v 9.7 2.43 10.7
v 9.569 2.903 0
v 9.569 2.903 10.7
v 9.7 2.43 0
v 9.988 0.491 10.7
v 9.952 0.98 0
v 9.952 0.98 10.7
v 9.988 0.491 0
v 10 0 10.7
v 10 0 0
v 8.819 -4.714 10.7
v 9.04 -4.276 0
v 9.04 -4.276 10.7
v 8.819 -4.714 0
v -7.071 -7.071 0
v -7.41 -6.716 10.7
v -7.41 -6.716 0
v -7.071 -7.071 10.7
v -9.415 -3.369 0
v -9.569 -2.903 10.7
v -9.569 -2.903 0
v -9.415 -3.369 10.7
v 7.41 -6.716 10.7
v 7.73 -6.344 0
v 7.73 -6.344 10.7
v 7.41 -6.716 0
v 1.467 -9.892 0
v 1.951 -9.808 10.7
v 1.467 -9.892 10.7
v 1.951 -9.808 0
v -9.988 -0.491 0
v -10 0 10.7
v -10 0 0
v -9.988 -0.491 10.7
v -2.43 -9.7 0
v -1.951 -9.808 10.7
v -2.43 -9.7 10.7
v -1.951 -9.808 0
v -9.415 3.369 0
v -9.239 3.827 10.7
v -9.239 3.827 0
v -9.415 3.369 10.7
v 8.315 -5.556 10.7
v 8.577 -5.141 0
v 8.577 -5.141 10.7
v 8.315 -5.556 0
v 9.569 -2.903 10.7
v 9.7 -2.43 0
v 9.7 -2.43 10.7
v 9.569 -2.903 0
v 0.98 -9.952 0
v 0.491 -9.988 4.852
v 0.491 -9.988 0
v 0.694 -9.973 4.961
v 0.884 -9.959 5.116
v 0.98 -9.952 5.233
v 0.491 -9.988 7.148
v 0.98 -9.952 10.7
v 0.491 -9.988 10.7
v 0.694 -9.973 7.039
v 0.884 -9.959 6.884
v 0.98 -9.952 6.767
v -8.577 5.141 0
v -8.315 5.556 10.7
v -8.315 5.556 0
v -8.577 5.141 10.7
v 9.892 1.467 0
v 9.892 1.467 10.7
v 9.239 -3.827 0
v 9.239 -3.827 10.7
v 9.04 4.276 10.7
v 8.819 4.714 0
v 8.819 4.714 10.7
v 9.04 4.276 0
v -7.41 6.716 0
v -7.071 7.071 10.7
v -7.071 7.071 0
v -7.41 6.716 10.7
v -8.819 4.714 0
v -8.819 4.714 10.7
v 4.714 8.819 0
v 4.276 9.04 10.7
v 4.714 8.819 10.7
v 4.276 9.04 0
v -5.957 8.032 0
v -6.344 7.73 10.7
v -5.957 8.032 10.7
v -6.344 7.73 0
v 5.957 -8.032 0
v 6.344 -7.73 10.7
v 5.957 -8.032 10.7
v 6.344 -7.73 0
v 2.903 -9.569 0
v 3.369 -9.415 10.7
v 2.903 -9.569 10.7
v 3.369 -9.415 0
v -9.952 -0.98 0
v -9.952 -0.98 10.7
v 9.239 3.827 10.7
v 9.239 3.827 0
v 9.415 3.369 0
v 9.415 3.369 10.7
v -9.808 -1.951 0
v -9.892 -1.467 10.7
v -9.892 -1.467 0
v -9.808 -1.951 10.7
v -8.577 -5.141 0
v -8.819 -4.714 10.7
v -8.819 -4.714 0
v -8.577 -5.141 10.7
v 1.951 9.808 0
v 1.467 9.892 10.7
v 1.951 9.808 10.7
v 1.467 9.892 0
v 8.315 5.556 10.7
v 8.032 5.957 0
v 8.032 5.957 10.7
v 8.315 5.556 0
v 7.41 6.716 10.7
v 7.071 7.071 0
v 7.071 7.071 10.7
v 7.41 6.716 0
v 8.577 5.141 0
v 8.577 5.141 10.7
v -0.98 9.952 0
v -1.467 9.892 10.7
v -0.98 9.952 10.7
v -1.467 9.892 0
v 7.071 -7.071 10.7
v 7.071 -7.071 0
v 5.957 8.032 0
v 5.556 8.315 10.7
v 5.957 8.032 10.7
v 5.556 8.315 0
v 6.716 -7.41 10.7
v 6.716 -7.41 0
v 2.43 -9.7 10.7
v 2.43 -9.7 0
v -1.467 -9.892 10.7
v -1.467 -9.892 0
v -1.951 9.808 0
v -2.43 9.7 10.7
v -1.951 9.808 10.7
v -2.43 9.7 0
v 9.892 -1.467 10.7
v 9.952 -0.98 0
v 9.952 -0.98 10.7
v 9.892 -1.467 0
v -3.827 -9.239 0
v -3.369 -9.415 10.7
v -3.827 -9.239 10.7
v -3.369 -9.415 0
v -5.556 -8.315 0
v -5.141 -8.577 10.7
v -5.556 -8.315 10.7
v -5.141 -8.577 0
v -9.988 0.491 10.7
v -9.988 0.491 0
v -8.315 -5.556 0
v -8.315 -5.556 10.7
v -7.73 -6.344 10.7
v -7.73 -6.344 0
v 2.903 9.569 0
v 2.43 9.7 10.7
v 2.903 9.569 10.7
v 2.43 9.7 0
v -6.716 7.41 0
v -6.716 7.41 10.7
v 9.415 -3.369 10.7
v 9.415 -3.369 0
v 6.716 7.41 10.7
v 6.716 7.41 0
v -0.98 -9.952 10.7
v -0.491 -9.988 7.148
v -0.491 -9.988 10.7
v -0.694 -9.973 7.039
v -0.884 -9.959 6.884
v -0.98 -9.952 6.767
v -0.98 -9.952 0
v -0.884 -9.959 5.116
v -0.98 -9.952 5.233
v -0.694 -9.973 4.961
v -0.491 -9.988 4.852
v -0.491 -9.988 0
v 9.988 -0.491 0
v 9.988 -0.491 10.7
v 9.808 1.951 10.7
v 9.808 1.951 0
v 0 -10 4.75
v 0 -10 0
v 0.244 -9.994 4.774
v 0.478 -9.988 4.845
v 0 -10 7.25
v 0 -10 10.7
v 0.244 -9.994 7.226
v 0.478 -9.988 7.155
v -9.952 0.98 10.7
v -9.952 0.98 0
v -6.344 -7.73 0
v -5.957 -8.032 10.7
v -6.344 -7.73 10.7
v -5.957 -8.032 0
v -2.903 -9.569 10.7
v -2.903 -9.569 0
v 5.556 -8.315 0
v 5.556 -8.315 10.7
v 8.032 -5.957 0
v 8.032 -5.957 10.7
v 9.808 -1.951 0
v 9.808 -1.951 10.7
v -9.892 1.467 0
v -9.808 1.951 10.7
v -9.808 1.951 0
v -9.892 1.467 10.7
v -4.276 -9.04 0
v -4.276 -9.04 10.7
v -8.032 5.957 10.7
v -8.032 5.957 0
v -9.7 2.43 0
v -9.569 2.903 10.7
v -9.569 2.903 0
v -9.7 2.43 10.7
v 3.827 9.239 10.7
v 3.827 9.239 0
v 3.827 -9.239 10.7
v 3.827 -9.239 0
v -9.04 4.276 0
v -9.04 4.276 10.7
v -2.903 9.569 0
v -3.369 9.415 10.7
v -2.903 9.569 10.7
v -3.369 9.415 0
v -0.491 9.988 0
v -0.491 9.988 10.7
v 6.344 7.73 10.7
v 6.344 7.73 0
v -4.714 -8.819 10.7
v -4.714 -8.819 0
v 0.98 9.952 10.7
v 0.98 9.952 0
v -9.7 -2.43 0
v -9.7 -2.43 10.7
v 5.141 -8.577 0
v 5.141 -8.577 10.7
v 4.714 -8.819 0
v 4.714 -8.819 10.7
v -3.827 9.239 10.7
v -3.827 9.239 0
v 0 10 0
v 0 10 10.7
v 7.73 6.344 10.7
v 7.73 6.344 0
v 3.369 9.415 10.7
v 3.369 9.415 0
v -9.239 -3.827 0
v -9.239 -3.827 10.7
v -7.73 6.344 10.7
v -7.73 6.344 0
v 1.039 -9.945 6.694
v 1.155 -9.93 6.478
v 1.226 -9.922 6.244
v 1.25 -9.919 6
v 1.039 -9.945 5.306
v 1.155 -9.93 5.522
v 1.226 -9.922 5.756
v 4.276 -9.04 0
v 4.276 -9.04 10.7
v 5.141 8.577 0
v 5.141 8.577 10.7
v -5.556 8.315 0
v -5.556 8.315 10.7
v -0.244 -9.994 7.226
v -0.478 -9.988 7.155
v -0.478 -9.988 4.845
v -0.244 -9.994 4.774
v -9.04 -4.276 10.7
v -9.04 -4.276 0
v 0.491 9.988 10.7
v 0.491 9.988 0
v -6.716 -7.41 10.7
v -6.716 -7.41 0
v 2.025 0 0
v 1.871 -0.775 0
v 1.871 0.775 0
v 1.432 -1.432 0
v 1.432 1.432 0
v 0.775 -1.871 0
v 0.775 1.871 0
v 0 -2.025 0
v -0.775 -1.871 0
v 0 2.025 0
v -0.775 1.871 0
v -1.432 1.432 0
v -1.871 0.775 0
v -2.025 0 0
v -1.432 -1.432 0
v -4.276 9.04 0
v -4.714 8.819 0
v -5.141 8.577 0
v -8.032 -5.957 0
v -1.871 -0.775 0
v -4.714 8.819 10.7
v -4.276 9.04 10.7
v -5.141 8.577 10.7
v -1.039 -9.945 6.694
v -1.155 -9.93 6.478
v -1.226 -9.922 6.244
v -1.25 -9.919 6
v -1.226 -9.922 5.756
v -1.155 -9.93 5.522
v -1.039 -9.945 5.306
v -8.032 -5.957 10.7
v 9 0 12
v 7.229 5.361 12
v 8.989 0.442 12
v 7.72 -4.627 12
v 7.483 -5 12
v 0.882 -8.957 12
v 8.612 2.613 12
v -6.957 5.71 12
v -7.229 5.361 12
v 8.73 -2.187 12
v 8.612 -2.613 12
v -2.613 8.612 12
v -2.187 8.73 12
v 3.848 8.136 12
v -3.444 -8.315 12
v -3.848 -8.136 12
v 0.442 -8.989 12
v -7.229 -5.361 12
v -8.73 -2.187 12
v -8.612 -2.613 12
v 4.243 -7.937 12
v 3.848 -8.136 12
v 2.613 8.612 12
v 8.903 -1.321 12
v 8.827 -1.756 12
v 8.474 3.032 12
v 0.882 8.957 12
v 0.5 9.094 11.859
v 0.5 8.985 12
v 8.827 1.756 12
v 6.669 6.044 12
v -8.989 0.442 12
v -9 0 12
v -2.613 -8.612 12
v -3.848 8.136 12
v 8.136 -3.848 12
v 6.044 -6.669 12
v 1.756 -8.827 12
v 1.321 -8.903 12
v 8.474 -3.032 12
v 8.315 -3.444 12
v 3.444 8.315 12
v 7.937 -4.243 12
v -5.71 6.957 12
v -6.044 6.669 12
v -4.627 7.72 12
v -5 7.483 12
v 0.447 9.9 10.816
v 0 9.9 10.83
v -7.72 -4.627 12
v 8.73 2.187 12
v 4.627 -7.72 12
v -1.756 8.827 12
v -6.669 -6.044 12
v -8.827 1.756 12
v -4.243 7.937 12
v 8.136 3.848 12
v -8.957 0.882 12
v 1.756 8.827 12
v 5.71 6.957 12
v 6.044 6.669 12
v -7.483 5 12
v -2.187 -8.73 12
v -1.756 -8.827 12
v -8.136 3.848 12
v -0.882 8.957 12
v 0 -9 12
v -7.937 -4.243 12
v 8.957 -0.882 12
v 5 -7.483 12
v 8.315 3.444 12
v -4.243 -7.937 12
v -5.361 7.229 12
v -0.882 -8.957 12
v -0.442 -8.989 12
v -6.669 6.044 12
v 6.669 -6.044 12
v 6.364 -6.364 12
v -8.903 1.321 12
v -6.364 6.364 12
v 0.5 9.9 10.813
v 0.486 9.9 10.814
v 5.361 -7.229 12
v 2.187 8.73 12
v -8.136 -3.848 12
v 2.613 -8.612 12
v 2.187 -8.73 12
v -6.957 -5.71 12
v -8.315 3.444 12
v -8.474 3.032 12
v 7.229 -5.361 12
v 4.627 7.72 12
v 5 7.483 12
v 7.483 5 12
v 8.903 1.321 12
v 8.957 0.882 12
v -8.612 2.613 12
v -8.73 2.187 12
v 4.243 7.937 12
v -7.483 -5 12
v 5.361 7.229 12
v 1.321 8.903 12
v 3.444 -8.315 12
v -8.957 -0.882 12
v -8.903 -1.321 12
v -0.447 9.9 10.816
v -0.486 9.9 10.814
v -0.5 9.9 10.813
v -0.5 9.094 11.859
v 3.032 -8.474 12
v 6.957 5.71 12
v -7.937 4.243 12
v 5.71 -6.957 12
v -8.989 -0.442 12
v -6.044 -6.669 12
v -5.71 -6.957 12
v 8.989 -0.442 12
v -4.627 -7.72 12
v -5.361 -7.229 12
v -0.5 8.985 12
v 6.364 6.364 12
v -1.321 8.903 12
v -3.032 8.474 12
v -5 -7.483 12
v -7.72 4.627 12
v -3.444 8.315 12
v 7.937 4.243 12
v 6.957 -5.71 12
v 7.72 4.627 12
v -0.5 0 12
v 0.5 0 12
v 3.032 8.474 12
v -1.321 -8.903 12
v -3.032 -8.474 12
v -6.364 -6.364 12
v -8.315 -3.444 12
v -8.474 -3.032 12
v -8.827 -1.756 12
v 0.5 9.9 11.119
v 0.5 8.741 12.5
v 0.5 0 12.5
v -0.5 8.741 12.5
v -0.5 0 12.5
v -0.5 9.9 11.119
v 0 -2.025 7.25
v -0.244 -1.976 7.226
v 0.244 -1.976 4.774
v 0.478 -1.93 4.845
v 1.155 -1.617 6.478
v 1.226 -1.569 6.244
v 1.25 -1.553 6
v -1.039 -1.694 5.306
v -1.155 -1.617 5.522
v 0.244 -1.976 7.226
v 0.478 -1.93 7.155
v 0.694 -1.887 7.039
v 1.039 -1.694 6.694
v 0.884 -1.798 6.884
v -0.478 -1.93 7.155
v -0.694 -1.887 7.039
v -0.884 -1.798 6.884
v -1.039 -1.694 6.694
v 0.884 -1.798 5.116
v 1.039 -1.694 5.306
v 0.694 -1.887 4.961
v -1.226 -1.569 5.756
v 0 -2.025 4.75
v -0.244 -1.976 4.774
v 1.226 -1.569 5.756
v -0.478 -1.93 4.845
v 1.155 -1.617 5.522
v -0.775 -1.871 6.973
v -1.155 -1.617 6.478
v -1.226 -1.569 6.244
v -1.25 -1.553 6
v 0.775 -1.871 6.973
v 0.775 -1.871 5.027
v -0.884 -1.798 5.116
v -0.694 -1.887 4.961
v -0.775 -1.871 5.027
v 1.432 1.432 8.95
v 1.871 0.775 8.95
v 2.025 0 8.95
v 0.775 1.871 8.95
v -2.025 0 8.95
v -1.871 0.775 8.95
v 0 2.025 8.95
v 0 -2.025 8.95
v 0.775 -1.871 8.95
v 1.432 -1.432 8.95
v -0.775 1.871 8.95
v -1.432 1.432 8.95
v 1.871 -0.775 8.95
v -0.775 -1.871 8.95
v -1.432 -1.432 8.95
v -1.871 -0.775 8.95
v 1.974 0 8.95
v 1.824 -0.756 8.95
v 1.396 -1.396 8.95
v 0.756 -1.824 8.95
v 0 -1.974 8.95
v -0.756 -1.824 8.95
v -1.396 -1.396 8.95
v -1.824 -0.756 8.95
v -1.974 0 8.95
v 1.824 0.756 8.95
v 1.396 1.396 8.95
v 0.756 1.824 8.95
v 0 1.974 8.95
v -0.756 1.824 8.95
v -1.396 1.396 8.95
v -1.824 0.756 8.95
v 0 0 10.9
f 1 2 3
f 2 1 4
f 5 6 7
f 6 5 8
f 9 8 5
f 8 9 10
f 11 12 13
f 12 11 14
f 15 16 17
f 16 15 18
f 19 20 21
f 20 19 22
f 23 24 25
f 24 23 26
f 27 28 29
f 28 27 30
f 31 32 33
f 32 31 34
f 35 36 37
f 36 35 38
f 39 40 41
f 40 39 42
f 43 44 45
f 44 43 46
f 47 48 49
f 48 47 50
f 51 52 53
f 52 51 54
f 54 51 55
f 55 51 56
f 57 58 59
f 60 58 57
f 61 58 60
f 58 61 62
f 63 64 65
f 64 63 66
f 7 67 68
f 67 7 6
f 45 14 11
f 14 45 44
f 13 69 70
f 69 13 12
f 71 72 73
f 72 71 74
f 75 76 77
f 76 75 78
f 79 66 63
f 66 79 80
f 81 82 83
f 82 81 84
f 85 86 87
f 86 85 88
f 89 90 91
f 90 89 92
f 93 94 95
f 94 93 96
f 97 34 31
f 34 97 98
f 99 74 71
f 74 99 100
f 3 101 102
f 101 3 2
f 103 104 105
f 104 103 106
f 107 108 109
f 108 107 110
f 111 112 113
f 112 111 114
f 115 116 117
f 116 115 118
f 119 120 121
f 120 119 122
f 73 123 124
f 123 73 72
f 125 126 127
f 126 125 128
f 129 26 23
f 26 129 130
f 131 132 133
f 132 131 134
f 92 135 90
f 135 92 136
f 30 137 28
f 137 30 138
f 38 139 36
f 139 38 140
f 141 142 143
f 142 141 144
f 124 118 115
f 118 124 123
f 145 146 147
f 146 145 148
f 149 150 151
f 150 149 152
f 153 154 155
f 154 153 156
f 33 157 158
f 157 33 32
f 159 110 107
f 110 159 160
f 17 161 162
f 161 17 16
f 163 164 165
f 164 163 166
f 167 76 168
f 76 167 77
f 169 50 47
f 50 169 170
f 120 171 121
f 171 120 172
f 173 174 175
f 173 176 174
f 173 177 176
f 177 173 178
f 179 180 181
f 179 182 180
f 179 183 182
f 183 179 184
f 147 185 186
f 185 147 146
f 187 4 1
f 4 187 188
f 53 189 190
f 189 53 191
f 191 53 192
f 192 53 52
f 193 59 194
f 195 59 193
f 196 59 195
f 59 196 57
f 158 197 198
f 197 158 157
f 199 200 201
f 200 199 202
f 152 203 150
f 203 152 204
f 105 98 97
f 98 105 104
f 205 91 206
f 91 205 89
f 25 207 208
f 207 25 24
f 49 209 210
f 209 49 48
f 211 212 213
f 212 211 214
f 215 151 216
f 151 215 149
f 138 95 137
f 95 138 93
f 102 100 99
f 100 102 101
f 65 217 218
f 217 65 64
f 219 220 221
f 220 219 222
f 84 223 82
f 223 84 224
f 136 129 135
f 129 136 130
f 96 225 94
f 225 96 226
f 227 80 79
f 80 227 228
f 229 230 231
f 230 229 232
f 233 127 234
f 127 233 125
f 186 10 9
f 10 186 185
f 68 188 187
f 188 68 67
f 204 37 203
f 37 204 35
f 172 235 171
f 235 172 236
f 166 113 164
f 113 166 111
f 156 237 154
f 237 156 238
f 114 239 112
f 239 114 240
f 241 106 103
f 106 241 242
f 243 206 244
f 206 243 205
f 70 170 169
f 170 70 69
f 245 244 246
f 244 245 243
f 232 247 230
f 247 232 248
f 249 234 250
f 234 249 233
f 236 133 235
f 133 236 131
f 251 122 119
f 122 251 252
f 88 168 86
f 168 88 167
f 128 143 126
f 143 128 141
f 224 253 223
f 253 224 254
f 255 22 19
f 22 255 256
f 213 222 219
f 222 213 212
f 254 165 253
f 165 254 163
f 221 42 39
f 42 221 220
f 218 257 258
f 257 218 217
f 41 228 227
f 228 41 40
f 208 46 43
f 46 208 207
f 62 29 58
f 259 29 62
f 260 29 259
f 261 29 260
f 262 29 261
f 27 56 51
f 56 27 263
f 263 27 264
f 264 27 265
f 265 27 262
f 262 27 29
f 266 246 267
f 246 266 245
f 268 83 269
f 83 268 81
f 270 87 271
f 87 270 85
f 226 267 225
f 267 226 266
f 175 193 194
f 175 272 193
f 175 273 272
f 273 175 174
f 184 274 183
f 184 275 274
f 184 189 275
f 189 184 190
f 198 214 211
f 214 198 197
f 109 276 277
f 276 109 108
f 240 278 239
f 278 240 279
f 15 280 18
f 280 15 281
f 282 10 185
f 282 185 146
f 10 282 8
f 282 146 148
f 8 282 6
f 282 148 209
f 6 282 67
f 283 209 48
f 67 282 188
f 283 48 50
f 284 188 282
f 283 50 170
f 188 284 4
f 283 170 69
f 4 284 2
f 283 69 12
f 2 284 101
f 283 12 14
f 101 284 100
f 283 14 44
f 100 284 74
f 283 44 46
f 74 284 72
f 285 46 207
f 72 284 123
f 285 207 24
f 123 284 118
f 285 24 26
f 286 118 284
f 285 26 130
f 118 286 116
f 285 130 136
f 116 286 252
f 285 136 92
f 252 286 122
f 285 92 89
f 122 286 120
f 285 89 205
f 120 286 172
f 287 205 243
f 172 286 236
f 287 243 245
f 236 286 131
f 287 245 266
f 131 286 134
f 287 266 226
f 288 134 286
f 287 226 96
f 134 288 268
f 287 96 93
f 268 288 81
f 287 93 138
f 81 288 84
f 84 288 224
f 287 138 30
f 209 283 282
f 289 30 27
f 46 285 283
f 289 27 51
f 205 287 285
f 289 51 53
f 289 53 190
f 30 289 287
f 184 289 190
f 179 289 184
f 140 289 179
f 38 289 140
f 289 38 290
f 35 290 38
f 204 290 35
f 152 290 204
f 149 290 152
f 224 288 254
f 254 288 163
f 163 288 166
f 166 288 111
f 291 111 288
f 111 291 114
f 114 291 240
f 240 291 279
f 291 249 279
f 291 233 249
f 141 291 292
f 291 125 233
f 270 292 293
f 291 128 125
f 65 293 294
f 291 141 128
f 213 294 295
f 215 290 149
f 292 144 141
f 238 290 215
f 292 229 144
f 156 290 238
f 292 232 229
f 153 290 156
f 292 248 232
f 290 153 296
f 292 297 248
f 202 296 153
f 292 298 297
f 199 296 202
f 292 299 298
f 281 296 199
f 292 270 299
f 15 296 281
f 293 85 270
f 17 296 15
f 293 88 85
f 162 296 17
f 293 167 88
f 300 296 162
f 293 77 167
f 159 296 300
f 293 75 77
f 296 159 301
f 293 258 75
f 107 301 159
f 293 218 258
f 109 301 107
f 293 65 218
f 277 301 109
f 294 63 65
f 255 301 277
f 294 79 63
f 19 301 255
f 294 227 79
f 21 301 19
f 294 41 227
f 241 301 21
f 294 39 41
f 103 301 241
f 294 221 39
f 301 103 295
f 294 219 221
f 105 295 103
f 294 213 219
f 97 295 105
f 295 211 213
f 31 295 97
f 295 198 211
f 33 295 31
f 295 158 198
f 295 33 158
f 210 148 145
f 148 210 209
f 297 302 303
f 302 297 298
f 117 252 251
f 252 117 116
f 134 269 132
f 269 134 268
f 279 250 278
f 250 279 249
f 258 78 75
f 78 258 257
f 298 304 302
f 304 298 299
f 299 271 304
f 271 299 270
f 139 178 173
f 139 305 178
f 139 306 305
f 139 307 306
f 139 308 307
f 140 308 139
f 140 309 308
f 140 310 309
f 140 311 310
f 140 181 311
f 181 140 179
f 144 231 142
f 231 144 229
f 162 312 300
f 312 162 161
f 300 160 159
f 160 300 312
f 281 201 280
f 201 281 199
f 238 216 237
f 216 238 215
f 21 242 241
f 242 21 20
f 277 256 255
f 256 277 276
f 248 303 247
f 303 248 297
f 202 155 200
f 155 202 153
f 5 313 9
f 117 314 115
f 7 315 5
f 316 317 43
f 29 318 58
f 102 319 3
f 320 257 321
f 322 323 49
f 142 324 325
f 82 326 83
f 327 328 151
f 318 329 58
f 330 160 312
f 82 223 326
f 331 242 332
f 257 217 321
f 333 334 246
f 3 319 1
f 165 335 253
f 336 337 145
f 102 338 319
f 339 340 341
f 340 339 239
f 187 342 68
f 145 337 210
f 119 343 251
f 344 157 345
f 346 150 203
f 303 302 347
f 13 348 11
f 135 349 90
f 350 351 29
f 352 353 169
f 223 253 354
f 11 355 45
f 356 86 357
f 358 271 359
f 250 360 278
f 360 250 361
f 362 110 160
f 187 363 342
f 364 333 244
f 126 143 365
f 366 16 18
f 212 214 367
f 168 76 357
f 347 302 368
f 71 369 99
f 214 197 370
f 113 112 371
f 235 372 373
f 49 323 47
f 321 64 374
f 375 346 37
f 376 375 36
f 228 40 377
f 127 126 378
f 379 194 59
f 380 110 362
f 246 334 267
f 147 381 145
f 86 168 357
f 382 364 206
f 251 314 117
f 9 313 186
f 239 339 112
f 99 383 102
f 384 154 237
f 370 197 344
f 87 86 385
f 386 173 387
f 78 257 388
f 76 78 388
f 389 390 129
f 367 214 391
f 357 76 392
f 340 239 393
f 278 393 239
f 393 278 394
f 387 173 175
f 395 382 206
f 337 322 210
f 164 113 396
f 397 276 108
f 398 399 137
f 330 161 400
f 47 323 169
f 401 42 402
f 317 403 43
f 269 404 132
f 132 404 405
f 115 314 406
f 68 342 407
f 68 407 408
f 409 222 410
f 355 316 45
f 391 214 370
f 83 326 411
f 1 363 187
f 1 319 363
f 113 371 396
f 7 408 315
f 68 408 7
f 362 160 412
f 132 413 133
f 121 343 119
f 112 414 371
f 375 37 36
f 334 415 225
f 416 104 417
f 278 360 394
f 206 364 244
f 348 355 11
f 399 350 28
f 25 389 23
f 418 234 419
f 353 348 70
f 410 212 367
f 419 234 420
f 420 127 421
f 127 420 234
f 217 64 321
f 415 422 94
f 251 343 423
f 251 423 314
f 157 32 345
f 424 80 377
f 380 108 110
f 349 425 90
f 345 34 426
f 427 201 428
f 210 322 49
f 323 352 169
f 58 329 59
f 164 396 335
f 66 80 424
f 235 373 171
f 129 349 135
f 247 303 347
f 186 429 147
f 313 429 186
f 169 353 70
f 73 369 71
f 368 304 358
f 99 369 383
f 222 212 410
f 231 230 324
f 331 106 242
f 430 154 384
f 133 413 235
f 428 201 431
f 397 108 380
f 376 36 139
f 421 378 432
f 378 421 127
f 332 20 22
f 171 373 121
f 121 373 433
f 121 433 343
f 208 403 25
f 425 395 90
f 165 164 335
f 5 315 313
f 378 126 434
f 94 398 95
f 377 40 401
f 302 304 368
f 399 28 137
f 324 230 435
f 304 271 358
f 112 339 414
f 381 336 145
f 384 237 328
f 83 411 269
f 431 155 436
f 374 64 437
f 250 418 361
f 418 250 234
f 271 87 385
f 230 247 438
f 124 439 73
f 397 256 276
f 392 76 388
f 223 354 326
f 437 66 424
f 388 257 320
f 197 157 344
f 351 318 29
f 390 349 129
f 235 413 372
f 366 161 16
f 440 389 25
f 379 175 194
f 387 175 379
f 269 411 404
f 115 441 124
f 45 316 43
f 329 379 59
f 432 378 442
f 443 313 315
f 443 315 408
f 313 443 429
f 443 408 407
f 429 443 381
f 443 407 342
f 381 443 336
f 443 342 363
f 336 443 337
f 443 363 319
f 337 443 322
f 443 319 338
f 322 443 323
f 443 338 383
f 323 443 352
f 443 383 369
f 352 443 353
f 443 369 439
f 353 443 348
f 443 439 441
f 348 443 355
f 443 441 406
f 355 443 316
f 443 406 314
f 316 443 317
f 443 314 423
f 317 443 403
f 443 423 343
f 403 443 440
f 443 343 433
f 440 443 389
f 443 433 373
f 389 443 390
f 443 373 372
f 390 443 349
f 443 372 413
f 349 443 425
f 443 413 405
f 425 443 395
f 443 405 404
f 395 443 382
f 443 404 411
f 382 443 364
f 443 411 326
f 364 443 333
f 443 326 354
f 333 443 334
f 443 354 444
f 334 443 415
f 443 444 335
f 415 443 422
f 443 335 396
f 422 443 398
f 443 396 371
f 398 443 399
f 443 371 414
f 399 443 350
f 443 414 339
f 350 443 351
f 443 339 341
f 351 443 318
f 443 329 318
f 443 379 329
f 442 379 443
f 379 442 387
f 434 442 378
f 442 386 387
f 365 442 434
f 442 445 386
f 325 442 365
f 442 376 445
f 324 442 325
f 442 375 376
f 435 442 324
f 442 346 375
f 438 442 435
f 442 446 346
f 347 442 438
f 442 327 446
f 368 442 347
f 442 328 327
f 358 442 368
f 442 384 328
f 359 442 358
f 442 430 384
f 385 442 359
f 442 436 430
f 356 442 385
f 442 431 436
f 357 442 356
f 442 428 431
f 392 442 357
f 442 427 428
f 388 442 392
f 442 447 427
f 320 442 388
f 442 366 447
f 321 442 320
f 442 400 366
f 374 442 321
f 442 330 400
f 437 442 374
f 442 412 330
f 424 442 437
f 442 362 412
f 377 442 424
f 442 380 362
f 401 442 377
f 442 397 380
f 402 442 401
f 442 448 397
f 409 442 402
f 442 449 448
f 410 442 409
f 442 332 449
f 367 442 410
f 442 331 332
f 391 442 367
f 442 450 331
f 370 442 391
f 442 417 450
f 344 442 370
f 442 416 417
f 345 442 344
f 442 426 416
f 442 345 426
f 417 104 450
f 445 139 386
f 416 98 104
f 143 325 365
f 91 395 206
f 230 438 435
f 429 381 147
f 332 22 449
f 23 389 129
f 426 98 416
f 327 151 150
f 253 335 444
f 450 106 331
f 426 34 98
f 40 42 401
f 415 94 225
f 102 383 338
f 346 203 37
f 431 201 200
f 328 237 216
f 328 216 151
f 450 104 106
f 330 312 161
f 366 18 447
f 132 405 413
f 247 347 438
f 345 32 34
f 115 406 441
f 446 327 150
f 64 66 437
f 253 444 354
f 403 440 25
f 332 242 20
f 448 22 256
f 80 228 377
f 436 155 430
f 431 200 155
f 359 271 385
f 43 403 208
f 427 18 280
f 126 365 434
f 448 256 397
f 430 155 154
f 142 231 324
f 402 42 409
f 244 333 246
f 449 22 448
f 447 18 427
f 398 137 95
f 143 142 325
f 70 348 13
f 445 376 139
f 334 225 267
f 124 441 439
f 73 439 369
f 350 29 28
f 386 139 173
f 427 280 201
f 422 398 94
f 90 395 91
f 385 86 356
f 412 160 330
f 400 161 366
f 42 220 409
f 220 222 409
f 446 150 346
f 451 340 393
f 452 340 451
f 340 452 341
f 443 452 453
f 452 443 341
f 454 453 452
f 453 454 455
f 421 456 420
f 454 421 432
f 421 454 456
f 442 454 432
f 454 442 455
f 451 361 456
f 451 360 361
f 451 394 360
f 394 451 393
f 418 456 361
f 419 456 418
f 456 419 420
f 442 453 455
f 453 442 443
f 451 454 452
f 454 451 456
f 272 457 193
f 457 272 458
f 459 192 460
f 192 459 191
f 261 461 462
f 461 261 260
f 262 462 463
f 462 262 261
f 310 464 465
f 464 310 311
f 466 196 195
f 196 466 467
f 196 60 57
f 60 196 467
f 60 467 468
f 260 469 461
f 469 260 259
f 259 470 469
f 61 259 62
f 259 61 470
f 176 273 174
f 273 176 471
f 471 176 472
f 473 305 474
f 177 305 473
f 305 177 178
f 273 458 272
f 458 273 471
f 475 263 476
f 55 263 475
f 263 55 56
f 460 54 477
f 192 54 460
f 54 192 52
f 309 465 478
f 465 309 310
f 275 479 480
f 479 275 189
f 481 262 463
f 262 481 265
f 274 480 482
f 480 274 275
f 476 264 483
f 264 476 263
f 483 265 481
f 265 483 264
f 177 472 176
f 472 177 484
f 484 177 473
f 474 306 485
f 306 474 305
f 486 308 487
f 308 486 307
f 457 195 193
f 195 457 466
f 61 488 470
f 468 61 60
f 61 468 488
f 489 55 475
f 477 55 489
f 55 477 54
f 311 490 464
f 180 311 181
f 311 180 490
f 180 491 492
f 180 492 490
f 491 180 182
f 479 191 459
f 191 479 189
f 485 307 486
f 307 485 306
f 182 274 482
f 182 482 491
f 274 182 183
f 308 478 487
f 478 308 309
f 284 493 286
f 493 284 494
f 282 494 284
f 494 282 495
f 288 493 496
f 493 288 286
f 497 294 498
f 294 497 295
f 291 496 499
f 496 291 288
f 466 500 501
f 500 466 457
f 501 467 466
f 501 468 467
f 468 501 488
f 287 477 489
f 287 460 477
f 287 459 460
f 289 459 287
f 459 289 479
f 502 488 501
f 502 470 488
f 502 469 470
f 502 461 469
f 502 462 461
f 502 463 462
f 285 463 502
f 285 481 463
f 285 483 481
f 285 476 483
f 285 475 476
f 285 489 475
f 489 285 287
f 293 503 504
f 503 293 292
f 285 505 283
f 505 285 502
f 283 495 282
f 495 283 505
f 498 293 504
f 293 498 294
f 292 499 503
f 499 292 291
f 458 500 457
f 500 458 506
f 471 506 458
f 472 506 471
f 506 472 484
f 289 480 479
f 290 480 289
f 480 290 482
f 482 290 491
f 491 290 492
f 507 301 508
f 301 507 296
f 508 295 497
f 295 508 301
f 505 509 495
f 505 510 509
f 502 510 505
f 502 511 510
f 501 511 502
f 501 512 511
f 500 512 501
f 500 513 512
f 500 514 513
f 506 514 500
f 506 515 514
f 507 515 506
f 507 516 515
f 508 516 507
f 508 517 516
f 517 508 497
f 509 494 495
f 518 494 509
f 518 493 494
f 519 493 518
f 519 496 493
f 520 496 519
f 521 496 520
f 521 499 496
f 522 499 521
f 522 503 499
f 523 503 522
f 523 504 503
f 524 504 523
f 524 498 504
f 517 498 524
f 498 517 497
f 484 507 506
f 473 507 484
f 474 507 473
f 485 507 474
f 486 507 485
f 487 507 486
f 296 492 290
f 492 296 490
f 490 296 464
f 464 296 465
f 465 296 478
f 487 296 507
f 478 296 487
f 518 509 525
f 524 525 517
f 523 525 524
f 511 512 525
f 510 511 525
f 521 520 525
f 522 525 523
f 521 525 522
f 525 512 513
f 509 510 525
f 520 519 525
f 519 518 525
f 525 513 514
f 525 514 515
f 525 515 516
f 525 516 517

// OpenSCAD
//OpenSCAD-Skript

//Moduldefinition mit Parametern für Frontplattensystem im 19mm-Raster
module PotiKnopf (
//Parameter
diami=4.05,   //Wellendurchmesser Poti
diama=20,    //Außendurchmesser Knopf
diams=2.5,   //Klemmschraubendurchmesser 
hght=12,     //Höhe Knopf
hghti=12.5,  //Höhe Indikator
wdthi=1      //Breite Indikator
)
//Beginn Modul
{
difference(){   //difference 1
union(){        //union 1
difference(){   //difference 2
union(){        //union 2
    //alles, was vor der nächsten geschweiften Klammer steht, wird zusammengefügt (union 2)
//Körper des Frontplattensegments
cylinder(d=diama,h=hght-1.3,$fn=128);
translate([0,0,hght-1.3]) cylinder(d1=diama,d2=diama-2,h=1.3,$fn=128);
 
//Indikator
translate([-wdthi/2,0,0]) cube([wdthi,diama/2-0.1,hghti]);

}               //union 2 end
    //alles, was vor der nächsten geschweiften Klammer steht, wird davon abgezogen (difference 2)
//Anschrägung Indikator
translate([-wdthi,diama/2,hght-1]) rotate([40,0,0]) cube([2*wdthi,5,5]);
//Bohrung Klemmschraube M3
rotate([90,0,0]) translate([0,hght/2,0]) cylinder(d=diams,h=15,$fn=32);
//Bohrung Achse
translate([0,0,-0.05]) cylinder(d=diami,h=hght-3,$fn=16);
translate([0,0,hght-3-0.1]) cylinder(d1=diami,d2=0,h=2,$fn=16);
}  //difference 2 end
    //alles, was vor der nächsten geschweiften Klammer steht, wird dazu hinzugefügt (union 1)

}               //union 1 end
    //alles, was vor der nächsten geschweiften Klammer steht, wird davon wieder abgezogen (difference 1)

}               //difference 1 end

}  //module end

//Hier werden Instanzen des Moduls aufgerufen
translate([0,0,0]) PotiKnopf();
